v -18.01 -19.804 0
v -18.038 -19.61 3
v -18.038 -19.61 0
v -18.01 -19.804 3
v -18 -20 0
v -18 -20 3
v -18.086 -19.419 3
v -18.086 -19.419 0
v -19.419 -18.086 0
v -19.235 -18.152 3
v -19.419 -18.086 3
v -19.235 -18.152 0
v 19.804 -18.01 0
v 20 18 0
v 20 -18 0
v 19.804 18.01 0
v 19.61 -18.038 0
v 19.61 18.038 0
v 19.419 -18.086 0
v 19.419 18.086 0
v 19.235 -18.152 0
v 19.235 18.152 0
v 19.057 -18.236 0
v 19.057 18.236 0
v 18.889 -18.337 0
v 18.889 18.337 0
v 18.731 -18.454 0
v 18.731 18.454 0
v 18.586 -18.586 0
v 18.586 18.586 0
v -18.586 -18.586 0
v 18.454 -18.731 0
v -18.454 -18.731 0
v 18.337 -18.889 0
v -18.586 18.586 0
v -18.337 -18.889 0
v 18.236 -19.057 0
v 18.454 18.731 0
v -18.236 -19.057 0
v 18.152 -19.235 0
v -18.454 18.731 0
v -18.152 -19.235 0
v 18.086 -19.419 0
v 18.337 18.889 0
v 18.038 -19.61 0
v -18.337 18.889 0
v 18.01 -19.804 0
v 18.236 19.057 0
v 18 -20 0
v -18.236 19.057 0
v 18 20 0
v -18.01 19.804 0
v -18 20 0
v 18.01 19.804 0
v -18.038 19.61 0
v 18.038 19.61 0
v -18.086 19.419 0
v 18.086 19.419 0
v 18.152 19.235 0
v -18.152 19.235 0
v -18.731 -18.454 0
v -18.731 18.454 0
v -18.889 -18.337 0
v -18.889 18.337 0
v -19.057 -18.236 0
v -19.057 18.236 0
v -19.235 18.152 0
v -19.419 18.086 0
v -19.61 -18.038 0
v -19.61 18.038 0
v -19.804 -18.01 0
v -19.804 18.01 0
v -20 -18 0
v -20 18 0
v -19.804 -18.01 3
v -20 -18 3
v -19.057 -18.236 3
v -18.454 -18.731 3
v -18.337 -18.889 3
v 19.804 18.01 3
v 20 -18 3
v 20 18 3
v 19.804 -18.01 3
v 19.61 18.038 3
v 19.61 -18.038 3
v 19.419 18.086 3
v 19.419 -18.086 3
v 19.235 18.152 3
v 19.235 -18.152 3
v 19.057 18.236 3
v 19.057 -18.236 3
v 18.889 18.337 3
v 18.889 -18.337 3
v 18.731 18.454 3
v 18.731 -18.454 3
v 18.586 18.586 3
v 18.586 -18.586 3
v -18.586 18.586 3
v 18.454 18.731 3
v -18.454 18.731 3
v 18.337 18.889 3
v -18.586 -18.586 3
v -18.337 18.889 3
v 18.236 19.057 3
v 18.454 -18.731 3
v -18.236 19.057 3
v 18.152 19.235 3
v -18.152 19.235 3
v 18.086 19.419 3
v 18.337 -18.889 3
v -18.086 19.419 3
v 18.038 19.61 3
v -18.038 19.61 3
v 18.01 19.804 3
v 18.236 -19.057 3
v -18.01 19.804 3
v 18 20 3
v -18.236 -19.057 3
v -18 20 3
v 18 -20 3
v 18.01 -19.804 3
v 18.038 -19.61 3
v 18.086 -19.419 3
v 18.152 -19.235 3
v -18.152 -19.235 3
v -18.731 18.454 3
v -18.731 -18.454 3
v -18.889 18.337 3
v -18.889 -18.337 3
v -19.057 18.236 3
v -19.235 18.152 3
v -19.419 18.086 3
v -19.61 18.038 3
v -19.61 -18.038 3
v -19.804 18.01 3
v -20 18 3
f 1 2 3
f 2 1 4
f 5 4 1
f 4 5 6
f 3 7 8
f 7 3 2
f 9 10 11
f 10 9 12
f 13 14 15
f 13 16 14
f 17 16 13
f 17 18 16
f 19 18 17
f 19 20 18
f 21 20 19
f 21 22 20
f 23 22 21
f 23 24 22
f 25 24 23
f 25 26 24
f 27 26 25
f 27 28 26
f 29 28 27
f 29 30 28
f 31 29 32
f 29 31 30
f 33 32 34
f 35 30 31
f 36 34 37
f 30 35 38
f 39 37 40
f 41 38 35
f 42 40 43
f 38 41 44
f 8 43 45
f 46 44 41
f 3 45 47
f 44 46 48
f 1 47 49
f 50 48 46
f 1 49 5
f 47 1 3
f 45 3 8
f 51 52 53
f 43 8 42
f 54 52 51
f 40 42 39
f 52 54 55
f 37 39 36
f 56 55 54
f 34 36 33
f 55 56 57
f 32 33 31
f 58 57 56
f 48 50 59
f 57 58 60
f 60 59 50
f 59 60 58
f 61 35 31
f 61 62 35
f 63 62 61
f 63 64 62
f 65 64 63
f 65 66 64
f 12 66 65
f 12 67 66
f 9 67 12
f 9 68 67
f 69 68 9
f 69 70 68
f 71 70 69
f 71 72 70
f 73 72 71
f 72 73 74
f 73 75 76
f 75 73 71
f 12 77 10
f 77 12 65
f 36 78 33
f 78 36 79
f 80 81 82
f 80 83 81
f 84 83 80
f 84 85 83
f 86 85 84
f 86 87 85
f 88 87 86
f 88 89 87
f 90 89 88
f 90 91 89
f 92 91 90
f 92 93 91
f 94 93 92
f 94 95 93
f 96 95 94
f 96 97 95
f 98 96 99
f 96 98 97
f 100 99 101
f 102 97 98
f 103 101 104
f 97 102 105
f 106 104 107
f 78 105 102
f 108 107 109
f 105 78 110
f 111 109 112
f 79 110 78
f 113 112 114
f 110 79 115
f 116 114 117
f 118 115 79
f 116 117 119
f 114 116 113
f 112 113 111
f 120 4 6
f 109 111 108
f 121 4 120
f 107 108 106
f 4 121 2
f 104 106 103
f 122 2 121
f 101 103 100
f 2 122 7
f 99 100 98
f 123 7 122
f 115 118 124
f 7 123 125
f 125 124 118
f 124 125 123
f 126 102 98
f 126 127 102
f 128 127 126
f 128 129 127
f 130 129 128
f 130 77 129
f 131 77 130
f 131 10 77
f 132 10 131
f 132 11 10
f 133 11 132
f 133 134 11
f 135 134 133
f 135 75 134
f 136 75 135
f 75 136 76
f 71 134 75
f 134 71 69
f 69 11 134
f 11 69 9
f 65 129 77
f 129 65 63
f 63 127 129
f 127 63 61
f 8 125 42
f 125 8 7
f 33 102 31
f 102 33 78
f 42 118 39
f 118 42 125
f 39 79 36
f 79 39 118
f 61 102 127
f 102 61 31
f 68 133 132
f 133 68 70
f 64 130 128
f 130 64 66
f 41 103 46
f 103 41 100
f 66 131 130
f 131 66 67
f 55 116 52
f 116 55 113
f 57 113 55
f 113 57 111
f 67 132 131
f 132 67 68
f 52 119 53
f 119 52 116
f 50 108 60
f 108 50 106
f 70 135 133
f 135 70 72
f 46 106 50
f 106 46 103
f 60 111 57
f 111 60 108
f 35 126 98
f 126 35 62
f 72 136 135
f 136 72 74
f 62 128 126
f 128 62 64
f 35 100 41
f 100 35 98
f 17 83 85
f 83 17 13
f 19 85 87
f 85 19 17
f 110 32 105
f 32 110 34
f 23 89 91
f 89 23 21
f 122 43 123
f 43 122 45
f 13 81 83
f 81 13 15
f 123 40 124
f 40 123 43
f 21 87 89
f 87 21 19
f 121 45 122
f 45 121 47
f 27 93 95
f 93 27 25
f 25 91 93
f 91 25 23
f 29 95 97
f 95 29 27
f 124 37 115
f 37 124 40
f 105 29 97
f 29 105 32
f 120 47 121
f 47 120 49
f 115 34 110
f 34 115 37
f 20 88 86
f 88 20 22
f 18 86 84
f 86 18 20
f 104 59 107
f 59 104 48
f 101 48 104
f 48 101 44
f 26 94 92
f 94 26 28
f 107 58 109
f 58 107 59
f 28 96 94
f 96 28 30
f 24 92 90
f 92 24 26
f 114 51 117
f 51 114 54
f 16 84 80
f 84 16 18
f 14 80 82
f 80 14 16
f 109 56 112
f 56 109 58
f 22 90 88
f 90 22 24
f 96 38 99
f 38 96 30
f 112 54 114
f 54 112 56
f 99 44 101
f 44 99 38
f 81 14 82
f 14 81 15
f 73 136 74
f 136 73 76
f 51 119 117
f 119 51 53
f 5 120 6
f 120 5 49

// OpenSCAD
translate([-20, -20, 0])
difference() {
    // Base plate
    cube([40, 40, 3], center = false);
    
    // Corner holes
    for (x = [0, 40])
        for (y = [0, 40])
            translate([x, y, 0])
                cylinder(h = 3, r = 2, $fn = 64);
}
